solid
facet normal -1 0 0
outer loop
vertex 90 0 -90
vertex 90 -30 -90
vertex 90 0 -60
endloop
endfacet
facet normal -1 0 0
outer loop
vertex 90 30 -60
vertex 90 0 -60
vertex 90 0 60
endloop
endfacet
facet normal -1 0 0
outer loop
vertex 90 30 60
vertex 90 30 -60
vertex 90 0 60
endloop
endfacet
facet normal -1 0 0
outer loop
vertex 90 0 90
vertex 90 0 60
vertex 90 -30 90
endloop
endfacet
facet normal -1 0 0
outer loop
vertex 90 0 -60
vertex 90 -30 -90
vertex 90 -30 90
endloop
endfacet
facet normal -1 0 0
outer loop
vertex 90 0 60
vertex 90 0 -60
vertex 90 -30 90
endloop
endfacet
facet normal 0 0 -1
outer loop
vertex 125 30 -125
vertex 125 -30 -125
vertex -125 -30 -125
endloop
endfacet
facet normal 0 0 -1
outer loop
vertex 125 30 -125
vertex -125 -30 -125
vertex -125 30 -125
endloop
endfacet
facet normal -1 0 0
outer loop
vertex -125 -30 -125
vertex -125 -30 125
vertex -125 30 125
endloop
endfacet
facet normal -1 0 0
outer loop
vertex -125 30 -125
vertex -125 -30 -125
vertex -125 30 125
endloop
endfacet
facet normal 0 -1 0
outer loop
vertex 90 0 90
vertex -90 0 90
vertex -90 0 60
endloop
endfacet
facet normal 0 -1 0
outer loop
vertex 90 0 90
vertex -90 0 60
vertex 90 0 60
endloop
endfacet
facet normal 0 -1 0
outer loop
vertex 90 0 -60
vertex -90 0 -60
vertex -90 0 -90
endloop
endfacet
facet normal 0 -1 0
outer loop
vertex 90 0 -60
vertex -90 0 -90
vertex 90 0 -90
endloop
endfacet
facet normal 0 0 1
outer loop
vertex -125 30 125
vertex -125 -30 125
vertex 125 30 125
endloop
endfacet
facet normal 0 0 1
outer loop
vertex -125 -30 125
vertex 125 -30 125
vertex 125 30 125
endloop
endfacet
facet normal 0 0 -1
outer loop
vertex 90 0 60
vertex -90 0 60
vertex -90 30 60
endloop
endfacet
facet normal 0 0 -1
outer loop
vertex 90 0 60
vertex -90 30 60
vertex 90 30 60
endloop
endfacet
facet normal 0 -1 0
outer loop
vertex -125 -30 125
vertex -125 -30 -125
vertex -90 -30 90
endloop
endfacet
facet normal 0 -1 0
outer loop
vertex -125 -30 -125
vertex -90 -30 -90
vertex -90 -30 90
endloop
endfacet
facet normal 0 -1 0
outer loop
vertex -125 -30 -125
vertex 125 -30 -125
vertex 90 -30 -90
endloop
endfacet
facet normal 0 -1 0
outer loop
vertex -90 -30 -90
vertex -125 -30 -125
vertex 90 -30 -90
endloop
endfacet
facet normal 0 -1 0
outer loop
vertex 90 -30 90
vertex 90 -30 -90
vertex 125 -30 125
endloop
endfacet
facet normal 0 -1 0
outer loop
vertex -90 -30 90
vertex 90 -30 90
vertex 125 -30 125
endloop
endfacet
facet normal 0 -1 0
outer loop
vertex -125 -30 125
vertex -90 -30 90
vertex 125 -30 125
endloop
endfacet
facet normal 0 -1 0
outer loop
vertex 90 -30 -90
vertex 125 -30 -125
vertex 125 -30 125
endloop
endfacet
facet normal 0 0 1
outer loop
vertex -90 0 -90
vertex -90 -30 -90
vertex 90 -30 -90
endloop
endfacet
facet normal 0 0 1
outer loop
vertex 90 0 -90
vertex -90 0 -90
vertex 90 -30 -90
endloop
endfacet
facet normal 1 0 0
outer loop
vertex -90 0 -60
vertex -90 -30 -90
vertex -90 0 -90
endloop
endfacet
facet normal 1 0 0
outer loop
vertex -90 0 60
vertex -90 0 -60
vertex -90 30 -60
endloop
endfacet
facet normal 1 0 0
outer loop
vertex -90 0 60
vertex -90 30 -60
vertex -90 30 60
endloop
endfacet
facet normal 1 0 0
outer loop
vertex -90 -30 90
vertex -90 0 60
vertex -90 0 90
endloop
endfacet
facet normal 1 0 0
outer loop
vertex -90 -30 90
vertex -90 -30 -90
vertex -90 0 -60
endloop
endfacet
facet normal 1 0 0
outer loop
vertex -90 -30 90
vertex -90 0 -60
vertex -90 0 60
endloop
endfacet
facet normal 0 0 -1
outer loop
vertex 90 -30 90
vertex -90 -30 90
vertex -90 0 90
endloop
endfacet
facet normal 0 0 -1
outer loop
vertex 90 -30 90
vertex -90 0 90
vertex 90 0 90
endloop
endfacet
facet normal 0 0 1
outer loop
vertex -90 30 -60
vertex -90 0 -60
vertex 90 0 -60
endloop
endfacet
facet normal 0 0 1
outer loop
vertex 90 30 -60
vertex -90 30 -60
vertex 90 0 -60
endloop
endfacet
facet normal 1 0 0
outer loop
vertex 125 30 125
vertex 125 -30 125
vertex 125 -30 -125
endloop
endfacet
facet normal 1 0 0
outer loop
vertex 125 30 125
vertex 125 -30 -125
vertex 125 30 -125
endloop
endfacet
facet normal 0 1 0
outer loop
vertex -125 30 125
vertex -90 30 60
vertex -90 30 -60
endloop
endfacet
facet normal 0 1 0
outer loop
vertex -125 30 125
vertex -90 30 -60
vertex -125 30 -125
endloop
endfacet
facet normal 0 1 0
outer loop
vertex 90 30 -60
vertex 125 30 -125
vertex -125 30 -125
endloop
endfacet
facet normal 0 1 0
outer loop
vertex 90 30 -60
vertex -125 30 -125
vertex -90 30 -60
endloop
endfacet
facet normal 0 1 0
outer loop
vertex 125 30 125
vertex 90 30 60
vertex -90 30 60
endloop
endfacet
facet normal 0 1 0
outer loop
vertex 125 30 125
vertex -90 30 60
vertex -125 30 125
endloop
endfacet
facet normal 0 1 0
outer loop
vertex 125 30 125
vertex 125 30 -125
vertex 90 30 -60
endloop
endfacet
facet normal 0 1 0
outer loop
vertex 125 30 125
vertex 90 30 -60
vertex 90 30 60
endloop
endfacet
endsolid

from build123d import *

# Parameters (mm, degrees)
F0_W     = 60
F0_H     = 250
F1_DEPTH = 125
F2_W     = 180
F2_H     = 180
F3_DEPTH = 30
F4_W     = 180
F4_H     = 120
F5_DEPTH = 30.001


with BuildPart() as f1:
    # F0 (on Right) → F1 (new body, symmetric)
    with BuildSketch(Plane.YZ):
        Rectangle(F0_W, F0_H)
    extrude(amount=F1_DEPTH, both=True)

    # F2 (on face) → F3 (cut)
    with BuildSketch(Plane.XZ.offset(30)):
        Rectangle(F2_W, F2_H)
    extrude(amount=-F3_DEPTH, mode=Mode.SUBTRACT)

    # F4 (on face) → F5 (cut, through all)
    with BuildSketch(Plane.XZ):
        Rectangle(F4_W, F4_H)
    extrude(amount=-F5_DEPTH, mode=Mode.SUBTRACT)


solid = f1.part
